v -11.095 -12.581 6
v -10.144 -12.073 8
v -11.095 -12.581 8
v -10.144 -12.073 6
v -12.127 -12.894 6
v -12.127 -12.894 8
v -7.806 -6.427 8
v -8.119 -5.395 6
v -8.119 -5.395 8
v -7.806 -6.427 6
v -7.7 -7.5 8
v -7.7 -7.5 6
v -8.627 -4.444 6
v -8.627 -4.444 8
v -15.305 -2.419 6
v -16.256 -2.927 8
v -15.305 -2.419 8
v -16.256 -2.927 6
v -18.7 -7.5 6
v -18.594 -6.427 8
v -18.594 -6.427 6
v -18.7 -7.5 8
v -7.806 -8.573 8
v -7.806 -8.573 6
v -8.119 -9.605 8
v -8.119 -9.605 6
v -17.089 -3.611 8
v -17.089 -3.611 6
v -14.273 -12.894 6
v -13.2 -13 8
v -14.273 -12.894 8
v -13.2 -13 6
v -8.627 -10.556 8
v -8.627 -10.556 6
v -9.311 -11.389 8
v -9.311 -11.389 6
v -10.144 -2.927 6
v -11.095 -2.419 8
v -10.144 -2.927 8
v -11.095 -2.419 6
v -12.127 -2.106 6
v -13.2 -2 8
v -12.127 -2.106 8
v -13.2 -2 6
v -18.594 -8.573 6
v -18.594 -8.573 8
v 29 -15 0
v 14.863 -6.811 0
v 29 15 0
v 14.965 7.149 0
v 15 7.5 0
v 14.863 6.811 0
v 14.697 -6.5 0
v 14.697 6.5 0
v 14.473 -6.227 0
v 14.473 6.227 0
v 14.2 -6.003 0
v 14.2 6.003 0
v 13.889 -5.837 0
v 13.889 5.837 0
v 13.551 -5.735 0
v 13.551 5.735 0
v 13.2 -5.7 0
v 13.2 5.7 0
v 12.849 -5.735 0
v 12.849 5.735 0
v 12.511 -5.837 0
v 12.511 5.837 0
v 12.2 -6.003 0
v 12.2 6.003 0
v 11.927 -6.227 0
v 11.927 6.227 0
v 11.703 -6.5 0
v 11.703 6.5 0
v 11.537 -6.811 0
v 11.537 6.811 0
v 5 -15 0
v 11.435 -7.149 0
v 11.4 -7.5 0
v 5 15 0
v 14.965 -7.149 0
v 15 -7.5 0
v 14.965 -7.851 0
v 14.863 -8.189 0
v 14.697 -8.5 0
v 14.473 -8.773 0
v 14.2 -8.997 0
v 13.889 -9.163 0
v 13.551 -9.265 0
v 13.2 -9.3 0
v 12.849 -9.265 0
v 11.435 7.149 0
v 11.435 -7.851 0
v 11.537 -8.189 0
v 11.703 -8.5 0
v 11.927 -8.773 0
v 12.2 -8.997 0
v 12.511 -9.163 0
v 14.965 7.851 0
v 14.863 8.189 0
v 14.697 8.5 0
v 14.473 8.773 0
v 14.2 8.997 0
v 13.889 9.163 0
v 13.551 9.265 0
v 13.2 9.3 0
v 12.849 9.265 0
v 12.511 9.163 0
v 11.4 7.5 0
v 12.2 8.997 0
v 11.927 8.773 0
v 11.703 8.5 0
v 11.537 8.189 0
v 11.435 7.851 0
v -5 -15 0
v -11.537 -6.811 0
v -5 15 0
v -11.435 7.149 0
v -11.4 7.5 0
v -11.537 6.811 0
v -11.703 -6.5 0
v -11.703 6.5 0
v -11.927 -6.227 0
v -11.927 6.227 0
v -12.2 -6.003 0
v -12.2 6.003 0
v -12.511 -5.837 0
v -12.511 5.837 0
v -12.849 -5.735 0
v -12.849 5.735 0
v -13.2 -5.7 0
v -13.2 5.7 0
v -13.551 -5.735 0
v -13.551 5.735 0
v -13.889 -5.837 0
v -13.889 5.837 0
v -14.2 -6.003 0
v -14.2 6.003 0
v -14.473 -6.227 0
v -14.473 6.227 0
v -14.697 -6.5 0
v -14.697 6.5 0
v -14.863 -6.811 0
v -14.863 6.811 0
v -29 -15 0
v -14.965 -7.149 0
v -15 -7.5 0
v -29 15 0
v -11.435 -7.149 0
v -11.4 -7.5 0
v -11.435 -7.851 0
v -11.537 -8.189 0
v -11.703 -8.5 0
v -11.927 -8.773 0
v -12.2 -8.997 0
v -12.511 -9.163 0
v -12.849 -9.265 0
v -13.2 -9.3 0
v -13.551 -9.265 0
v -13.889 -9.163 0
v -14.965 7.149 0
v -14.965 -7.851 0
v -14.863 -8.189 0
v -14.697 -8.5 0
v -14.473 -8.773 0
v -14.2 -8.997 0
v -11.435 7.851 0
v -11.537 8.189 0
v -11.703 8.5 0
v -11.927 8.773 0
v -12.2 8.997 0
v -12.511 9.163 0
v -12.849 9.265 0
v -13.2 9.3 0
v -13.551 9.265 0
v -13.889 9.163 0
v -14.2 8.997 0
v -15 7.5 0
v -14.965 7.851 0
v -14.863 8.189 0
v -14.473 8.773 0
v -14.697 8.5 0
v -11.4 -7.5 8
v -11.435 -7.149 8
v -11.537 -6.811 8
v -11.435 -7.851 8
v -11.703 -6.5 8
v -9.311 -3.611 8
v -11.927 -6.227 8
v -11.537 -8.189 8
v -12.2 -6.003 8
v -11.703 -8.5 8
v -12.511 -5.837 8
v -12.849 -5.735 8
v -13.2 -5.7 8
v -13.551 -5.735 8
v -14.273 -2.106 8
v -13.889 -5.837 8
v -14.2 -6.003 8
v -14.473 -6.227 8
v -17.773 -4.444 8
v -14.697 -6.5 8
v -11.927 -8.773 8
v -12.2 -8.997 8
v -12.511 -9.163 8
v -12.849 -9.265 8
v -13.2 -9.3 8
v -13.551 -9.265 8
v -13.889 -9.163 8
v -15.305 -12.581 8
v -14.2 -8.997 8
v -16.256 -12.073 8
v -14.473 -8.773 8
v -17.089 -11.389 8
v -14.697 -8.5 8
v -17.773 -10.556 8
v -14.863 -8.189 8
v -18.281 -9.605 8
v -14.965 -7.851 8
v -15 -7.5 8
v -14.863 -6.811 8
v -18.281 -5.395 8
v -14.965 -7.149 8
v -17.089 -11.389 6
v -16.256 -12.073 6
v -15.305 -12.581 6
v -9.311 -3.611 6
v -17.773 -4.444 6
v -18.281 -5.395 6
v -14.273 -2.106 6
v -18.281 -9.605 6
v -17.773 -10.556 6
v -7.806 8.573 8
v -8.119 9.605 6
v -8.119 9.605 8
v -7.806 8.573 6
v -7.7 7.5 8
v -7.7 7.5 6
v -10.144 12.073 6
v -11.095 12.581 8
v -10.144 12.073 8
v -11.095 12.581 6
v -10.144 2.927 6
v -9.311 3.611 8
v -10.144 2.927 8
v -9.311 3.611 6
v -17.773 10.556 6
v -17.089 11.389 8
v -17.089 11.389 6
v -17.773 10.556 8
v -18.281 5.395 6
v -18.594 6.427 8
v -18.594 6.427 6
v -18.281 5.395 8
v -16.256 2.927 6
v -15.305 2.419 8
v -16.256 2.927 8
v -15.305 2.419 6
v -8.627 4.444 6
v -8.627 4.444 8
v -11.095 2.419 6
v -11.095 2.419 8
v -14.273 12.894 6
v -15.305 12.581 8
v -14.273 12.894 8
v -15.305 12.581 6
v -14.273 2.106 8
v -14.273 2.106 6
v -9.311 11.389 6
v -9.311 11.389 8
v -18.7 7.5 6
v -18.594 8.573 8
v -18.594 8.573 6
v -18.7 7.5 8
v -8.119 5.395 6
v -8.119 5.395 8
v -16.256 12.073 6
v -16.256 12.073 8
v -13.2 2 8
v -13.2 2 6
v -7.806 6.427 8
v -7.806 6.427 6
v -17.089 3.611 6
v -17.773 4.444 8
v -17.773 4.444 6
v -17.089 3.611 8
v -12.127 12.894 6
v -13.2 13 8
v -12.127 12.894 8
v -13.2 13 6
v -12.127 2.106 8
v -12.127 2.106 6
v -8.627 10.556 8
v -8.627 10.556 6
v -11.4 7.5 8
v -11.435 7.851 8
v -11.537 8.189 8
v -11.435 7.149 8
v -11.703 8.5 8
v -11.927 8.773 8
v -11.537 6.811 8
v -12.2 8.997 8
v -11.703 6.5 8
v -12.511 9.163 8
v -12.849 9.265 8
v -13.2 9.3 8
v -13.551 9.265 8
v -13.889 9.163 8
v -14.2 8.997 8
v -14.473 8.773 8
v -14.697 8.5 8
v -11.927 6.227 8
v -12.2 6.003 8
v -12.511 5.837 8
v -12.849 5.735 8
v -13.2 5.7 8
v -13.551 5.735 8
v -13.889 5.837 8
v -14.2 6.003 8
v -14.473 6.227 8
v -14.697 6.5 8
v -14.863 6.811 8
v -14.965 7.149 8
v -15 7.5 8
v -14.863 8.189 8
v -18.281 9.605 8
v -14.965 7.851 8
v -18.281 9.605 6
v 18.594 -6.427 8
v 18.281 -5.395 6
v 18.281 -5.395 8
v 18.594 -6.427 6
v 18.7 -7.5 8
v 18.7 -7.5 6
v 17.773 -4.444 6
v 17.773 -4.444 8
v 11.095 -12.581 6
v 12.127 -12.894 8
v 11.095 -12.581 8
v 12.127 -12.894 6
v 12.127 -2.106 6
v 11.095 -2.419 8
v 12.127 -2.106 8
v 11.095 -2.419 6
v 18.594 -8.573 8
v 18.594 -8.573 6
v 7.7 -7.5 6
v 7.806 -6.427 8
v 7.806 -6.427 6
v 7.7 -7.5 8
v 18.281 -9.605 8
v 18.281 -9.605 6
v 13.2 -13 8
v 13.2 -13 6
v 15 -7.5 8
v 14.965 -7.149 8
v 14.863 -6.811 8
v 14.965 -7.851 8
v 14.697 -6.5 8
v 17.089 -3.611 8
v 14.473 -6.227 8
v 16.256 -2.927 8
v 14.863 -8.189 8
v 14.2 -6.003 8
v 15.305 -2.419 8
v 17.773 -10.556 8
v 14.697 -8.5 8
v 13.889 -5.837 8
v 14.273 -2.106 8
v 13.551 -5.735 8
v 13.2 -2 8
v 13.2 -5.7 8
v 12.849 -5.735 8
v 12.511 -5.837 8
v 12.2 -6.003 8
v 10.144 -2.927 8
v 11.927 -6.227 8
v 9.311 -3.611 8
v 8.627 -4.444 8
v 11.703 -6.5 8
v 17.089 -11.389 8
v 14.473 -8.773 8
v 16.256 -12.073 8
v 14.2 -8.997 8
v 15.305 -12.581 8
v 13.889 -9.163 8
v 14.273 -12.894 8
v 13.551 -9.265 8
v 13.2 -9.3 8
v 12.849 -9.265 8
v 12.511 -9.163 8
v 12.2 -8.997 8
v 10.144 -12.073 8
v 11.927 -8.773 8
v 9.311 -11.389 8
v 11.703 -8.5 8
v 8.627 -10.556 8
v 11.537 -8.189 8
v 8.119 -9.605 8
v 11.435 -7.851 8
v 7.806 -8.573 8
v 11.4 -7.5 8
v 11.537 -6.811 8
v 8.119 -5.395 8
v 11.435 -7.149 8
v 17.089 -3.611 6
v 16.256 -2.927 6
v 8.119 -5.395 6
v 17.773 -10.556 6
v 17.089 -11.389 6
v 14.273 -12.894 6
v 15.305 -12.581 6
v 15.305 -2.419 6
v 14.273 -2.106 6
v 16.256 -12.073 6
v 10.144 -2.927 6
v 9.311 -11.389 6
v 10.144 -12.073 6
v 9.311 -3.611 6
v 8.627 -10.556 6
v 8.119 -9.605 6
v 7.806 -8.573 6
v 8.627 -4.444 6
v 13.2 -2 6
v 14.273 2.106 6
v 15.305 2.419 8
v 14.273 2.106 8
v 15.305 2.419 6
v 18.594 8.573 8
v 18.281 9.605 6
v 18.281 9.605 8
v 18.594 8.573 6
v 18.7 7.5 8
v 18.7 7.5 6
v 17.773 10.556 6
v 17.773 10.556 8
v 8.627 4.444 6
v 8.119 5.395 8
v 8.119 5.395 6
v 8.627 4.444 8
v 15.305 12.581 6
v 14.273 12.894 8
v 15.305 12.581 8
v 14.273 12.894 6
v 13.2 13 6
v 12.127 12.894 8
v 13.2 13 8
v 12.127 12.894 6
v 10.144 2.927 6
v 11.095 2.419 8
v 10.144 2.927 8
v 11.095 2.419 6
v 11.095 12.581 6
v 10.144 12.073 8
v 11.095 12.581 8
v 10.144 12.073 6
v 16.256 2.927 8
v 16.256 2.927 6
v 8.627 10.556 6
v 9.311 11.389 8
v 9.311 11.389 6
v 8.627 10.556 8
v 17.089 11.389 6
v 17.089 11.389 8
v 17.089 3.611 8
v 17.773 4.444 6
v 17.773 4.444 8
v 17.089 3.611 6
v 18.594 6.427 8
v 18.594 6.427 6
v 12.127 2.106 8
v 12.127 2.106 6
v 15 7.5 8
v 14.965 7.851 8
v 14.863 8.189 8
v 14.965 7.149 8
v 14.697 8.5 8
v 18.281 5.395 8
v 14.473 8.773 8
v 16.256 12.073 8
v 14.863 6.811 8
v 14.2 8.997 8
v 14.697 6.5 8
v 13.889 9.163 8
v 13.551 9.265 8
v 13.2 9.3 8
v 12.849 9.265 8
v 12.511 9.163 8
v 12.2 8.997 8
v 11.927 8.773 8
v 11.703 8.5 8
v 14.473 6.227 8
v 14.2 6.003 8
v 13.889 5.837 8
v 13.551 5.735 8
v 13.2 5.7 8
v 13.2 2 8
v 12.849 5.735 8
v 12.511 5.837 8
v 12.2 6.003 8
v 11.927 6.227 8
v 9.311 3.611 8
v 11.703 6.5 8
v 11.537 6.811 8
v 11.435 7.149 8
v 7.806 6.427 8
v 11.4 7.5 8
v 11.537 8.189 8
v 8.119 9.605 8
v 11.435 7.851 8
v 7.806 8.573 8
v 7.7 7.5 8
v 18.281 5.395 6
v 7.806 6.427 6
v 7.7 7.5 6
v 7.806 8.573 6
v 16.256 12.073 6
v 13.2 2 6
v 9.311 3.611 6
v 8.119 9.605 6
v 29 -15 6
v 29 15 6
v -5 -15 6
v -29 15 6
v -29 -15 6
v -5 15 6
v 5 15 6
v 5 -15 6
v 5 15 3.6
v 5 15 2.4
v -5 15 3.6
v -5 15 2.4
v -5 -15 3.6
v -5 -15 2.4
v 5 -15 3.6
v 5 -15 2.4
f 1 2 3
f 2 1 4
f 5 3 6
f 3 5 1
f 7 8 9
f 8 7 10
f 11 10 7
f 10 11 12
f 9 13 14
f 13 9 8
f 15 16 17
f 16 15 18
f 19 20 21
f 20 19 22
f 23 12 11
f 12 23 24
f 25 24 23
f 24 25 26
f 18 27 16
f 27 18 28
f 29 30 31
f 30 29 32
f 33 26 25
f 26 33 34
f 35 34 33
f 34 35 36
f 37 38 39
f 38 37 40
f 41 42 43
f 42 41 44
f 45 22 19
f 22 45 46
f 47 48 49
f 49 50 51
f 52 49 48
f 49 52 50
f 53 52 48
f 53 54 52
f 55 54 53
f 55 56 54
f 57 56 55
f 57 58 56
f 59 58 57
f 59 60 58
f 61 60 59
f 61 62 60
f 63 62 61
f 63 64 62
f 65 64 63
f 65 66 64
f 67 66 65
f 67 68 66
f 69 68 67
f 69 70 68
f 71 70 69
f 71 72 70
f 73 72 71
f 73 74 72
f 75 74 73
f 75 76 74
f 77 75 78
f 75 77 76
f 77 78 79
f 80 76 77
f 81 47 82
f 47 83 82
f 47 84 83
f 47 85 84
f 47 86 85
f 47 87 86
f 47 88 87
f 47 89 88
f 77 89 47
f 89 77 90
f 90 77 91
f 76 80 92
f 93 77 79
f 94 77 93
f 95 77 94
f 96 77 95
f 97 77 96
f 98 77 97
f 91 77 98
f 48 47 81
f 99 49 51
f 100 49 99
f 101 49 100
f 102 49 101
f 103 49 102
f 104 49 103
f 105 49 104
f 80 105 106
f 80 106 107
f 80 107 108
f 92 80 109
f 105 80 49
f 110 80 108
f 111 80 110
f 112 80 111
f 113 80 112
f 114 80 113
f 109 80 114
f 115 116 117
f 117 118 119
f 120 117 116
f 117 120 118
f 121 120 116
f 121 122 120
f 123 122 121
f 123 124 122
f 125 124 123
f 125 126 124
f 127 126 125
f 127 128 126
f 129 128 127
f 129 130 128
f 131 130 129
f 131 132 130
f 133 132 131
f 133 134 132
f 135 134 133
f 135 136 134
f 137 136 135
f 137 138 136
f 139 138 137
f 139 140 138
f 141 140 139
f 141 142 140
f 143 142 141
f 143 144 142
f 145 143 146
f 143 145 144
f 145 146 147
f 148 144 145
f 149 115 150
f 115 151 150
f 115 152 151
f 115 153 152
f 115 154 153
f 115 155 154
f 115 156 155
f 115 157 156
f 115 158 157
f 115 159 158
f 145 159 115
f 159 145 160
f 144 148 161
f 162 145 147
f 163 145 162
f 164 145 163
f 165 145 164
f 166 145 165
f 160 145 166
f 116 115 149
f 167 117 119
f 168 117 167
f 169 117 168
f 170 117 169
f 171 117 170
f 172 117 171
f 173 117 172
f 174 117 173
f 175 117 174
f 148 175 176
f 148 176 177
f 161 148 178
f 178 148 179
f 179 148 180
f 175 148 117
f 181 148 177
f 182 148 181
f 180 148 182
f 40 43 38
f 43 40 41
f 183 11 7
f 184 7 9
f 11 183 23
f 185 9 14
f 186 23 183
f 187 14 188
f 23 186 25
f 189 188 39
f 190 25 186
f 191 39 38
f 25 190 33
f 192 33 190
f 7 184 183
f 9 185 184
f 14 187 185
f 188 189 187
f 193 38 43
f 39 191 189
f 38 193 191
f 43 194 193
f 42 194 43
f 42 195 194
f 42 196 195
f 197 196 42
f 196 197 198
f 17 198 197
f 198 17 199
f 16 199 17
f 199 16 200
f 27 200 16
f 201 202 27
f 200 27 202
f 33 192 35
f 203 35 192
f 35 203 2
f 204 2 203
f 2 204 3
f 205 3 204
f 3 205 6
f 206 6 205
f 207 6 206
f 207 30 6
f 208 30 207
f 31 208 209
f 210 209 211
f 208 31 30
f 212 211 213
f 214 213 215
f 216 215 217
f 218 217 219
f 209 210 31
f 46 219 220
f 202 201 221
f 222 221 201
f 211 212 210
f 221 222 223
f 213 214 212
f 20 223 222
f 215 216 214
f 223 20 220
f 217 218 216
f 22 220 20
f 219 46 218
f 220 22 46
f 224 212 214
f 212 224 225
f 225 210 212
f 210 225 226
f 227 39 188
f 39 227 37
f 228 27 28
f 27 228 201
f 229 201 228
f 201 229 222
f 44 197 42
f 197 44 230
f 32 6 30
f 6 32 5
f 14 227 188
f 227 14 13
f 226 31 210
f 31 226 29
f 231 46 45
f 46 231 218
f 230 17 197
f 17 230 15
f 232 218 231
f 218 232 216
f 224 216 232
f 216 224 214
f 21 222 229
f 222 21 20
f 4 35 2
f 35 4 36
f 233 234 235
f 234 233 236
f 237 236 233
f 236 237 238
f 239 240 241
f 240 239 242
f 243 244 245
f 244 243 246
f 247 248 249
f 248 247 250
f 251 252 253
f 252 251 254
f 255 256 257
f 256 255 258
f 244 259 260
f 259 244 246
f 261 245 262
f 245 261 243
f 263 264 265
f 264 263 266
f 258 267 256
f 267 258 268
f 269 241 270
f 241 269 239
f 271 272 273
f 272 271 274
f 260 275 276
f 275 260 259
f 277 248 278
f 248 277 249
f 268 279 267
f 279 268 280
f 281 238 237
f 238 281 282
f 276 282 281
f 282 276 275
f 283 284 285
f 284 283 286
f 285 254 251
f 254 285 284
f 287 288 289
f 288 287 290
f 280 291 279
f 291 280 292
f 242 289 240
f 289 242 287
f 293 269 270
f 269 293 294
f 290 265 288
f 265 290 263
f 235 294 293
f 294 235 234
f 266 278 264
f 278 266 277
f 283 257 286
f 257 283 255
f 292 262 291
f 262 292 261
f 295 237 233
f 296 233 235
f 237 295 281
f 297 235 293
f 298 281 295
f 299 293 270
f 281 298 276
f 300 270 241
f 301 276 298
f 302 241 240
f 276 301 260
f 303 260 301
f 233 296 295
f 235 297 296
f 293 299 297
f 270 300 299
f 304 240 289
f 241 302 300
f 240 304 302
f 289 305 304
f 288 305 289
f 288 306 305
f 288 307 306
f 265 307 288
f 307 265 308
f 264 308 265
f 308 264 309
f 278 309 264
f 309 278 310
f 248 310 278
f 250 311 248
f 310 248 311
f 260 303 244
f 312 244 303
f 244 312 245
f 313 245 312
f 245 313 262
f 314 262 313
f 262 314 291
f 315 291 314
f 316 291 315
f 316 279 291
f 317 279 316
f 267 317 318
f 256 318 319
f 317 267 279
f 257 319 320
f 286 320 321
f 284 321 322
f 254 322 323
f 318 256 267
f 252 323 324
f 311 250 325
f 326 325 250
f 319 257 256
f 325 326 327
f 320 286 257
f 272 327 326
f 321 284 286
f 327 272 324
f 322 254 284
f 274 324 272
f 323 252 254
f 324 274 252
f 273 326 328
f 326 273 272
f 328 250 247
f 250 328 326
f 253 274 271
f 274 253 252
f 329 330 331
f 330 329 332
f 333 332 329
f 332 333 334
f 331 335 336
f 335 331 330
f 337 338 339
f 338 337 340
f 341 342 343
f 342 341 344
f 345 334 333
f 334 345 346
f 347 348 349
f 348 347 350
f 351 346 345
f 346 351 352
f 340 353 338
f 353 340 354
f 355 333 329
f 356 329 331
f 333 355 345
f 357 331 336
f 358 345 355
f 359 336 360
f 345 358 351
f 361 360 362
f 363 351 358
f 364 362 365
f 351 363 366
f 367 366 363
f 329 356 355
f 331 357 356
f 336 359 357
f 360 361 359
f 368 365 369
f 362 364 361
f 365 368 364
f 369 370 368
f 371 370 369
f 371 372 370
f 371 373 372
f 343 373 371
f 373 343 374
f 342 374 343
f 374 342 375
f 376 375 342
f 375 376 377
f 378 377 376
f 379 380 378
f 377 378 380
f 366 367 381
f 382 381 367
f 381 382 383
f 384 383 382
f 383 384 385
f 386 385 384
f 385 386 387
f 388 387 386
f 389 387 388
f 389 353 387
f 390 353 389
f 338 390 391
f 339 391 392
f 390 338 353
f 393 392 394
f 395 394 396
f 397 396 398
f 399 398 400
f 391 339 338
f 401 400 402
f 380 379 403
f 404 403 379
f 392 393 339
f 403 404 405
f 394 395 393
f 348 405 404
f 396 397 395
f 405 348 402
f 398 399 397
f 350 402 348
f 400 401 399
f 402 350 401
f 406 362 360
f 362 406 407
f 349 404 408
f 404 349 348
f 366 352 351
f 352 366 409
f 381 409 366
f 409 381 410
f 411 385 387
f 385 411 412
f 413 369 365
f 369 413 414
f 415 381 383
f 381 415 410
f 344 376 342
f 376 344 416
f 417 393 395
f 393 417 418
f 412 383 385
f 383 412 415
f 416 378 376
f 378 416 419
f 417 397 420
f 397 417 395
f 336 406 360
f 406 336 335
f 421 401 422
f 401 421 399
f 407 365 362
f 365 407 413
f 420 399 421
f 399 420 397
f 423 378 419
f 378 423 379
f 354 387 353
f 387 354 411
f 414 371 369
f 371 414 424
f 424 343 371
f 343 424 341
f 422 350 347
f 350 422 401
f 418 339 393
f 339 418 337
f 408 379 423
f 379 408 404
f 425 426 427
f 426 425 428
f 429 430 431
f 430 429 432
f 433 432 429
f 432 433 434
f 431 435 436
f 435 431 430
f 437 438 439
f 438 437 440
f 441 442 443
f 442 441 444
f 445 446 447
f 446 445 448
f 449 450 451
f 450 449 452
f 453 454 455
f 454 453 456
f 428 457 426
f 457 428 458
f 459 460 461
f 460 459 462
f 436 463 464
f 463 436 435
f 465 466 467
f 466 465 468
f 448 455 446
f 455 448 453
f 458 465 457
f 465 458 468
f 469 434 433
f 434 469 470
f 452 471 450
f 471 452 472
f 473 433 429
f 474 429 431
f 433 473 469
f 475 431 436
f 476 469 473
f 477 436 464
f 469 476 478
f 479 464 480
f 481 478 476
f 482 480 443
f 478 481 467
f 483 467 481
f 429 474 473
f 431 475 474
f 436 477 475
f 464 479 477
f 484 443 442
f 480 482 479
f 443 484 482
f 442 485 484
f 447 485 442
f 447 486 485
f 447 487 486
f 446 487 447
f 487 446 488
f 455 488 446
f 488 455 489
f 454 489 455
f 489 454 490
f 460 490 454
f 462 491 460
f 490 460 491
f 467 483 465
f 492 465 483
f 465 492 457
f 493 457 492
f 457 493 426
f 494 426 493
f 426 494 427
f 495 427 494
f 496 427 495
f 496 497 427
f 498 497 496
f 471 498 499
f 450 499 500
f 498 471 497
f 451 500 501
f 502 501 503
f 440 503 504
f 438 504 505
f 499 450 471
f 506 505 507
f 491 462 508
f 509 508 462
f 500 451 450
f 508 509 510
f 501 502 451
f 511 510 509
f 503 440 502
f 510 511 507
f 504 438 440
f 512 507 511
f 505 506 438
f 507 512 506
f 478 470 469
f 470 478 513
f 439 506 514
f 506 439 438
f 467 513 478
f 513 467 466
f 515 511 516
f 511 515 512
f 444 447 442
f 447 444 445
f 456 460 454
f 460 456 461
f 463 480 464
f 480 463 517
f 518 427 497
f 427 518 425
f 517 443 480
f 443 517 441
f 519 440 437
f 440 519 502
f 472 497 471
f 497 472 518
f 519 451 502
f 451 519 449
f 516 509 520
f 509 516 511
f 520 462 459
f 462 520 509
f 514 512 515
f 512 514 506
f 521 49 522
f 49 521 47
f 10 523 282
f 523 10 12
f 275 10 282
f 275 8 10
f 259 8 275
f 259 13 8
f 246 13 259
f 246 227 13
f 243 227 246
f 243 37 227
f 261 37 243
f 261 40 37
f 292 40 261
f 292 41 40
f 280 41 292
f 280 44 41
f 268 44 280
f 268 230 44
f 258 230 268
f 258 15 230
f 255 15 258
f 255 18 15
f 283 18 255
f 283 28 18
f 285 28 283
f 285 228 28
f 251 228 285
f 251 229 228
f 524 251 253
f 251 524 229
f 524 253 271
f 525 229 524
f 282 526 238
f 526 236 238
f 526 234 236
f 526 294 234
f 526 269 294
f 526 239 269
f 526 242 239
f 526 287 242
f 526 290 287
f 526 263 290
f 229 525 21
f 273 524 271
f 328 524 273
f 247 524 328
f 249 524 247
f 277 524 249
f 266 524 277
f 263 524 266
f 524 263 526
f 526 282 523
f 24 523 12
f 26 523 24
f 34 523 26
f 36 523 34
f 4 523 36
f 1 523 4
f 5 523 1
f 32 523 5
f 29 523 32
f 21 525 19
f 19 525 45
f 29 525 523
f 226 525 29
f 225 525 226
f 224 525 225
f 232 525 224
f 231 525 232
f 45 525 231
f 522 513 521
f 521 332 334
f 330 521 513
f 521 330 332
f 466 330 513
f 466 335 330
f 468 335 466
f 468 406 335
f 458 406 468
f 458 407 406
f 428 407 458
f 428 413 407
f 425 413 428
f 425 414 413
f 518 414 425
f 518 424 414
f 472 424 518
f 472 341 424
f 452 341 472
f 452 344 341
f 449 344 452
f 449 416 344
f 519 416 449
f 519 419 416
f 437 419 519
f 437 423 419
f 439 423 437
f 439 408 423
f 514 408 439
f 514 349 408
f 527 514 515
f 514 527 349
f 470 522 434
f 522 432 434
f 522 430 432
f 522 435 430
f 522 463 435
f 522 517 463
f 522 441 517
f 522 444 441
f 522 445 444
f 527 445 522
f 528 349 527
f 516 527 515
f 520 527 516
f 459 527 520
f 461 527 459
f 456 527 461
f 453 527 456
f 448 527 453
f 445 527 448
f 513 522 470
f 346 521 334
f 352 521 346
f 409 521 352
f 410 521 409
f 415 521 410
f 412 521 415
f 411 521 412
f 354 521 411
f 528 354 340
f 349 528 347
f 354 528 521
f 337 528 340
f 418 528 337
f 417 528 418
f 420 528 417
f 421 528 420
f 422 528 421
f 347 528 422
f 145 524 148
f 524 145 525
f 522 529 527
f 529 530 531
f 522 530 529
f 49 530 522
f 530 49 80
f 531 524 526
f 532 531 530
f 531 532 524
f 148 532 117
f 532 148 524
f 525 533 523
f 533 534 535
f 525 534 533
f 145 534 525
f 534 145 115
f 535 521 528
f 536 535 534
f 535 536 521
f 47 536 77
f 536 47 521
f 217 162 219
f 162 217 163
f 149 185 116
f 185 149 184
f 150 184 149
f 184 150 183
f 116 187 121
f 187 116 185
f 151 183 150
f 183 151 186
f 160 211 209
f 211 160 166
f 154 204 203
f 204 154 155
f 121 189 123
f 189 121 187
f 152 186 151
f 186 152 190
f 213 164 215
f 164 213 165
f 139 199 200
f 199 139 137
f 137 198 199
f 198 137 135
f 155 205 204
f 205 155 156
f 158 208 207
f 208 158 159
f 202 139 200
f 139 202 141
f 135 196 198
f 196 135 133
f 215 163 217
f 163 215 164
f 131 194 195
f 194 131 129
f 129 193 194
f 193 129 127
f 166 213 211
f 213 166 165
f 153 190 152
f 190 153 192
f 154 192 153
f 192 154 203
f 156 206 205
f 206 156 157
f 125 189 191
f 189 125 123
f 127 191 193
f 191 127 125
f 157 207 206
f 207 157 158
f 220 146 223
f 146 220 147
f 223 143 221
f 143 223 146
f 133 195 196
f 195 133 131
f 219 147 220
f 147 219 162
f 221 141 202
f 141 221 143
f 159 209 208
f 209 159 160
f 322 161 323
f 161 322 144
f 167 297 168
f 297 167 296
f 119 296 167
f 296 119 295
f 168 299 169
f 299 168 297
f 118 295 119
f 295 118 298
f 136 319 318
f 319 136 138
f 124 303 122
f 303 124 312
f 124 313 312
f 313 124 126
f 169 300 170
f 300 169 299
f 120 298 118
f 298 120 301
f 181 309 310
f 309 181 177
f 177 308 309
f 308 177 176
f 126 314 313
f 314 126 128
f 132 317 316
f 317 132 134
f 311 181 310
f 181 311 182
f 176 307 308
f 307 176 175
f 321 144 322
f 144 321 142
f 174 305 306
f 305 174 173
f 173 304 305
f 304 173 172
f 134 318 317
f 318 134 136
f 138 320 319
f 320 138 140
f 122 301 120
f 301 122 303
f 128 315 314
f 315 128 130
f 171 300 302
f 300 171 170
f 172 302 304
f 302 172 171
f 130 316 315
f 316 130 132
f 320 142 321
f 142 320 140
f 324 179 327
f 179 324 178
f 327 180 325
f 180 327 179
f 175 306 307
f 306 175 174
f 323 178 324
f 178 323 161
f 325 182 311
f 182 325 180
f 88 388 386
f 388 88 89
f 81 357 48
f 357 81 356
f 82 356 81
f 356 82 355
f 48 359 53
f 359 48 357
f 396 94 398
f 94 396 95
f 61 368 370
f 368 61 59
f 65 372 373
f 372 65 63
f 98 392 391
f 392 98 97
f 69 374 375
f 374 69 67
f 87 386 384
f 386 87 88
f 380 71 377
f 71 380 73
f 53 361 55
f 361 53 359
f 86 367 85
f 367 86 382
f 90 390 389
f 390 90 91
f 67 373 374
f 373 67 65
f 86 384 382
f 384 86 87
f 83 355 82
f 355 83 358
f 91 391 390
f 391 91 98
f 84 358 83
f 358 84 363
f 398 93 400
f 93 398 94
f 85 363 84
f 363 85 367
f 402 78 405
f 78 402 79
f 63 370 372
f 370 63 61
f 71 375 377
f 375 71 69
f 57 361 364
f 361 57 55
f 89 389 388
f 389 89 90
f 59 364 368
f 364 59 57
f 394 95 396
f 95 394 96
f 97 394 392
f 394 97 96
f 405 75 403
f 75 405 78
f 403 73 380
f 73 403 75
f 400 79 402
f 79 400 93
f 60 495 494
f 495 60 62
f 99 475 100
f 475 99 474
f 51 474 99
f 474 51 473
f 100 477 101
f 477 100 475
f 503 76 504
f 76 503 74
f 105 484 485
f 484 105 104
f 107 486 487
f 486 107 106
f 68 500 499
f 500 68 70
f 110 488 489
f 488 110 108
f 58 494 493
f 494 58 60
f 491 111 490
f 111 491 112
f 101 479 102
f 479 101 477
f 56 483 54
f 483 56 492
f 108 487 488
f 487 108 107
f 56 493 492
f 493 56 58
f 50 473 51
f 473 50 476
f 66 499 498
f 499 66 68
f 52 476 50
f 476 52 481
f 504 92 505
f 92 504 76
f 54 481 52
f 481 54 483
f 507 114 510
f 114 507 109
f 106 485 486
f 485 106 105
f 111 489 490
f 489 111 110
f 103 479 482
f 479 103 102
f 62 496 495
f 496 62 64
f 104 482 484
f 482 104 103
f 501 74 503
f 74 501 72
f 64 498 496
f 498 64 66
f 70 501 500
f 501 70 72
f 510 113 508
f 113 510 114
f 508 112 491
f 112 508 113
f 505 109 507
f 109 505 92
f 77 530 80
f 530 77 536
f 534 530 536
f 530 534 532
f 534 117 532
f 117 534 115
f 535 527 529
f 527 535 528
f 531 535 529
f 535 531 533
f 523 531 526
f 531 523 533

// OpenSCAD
$fn = 32;

// ----------------------------------------------------------------------
// Living hinge: 58 x 30 mm plates, 1.2 mm flexible web
// ----------------------------------------------------------------------

// --- parameters (mm) ---
plate_len = 24;           // plate length outside the web
plate_w = 30;             // plate width
thick = 6;                // plate thickness
web_half = 5;             // half width of the flex band
web_t = 1.2;              // flexible web thickness
web_z = 2.4;              // web position inside the thickness
boss_d = 11;              // screw boss diameter
boss_h = 8;               // screw boss height
boss_x = 13.2;            // screw boss distance from the web
screw_d = 3.6;            // screw hole

difference() {
  union() {
    /* one flat strip, later thinned at the middle */
    translate([-29, -15, 0]) cube([58, 30, 6]);
    /* screw bosses, sunk 0.5 mm into the plates */
    for (sx = [-13.2, 13.2]) {
      for (sy = [-7.5, 7.5]) {
        translate([sx, sy, 0]) cylinder(h = boss_h, d = boss_d);
      }
    }
  }
  /* channel from below: leaves the web on top of it */
  translate([-5, -17.5, -2.5]) cube([10, 35, 4.9]);
  /* channel from above: thins the web down to web_t */
  translate([-5, -17.5, 3.6]) cube([10, 35, 4.9]);
  /* screw holes through the bosses */
  for (sx = [-13.2, 13.2]) {
    for (sy = [-7.5, 7.5]) {
      translate([sx, sy, -2.5]) cylinder(h = boss_h + 5, d = screw_d);
    }
  }
}
